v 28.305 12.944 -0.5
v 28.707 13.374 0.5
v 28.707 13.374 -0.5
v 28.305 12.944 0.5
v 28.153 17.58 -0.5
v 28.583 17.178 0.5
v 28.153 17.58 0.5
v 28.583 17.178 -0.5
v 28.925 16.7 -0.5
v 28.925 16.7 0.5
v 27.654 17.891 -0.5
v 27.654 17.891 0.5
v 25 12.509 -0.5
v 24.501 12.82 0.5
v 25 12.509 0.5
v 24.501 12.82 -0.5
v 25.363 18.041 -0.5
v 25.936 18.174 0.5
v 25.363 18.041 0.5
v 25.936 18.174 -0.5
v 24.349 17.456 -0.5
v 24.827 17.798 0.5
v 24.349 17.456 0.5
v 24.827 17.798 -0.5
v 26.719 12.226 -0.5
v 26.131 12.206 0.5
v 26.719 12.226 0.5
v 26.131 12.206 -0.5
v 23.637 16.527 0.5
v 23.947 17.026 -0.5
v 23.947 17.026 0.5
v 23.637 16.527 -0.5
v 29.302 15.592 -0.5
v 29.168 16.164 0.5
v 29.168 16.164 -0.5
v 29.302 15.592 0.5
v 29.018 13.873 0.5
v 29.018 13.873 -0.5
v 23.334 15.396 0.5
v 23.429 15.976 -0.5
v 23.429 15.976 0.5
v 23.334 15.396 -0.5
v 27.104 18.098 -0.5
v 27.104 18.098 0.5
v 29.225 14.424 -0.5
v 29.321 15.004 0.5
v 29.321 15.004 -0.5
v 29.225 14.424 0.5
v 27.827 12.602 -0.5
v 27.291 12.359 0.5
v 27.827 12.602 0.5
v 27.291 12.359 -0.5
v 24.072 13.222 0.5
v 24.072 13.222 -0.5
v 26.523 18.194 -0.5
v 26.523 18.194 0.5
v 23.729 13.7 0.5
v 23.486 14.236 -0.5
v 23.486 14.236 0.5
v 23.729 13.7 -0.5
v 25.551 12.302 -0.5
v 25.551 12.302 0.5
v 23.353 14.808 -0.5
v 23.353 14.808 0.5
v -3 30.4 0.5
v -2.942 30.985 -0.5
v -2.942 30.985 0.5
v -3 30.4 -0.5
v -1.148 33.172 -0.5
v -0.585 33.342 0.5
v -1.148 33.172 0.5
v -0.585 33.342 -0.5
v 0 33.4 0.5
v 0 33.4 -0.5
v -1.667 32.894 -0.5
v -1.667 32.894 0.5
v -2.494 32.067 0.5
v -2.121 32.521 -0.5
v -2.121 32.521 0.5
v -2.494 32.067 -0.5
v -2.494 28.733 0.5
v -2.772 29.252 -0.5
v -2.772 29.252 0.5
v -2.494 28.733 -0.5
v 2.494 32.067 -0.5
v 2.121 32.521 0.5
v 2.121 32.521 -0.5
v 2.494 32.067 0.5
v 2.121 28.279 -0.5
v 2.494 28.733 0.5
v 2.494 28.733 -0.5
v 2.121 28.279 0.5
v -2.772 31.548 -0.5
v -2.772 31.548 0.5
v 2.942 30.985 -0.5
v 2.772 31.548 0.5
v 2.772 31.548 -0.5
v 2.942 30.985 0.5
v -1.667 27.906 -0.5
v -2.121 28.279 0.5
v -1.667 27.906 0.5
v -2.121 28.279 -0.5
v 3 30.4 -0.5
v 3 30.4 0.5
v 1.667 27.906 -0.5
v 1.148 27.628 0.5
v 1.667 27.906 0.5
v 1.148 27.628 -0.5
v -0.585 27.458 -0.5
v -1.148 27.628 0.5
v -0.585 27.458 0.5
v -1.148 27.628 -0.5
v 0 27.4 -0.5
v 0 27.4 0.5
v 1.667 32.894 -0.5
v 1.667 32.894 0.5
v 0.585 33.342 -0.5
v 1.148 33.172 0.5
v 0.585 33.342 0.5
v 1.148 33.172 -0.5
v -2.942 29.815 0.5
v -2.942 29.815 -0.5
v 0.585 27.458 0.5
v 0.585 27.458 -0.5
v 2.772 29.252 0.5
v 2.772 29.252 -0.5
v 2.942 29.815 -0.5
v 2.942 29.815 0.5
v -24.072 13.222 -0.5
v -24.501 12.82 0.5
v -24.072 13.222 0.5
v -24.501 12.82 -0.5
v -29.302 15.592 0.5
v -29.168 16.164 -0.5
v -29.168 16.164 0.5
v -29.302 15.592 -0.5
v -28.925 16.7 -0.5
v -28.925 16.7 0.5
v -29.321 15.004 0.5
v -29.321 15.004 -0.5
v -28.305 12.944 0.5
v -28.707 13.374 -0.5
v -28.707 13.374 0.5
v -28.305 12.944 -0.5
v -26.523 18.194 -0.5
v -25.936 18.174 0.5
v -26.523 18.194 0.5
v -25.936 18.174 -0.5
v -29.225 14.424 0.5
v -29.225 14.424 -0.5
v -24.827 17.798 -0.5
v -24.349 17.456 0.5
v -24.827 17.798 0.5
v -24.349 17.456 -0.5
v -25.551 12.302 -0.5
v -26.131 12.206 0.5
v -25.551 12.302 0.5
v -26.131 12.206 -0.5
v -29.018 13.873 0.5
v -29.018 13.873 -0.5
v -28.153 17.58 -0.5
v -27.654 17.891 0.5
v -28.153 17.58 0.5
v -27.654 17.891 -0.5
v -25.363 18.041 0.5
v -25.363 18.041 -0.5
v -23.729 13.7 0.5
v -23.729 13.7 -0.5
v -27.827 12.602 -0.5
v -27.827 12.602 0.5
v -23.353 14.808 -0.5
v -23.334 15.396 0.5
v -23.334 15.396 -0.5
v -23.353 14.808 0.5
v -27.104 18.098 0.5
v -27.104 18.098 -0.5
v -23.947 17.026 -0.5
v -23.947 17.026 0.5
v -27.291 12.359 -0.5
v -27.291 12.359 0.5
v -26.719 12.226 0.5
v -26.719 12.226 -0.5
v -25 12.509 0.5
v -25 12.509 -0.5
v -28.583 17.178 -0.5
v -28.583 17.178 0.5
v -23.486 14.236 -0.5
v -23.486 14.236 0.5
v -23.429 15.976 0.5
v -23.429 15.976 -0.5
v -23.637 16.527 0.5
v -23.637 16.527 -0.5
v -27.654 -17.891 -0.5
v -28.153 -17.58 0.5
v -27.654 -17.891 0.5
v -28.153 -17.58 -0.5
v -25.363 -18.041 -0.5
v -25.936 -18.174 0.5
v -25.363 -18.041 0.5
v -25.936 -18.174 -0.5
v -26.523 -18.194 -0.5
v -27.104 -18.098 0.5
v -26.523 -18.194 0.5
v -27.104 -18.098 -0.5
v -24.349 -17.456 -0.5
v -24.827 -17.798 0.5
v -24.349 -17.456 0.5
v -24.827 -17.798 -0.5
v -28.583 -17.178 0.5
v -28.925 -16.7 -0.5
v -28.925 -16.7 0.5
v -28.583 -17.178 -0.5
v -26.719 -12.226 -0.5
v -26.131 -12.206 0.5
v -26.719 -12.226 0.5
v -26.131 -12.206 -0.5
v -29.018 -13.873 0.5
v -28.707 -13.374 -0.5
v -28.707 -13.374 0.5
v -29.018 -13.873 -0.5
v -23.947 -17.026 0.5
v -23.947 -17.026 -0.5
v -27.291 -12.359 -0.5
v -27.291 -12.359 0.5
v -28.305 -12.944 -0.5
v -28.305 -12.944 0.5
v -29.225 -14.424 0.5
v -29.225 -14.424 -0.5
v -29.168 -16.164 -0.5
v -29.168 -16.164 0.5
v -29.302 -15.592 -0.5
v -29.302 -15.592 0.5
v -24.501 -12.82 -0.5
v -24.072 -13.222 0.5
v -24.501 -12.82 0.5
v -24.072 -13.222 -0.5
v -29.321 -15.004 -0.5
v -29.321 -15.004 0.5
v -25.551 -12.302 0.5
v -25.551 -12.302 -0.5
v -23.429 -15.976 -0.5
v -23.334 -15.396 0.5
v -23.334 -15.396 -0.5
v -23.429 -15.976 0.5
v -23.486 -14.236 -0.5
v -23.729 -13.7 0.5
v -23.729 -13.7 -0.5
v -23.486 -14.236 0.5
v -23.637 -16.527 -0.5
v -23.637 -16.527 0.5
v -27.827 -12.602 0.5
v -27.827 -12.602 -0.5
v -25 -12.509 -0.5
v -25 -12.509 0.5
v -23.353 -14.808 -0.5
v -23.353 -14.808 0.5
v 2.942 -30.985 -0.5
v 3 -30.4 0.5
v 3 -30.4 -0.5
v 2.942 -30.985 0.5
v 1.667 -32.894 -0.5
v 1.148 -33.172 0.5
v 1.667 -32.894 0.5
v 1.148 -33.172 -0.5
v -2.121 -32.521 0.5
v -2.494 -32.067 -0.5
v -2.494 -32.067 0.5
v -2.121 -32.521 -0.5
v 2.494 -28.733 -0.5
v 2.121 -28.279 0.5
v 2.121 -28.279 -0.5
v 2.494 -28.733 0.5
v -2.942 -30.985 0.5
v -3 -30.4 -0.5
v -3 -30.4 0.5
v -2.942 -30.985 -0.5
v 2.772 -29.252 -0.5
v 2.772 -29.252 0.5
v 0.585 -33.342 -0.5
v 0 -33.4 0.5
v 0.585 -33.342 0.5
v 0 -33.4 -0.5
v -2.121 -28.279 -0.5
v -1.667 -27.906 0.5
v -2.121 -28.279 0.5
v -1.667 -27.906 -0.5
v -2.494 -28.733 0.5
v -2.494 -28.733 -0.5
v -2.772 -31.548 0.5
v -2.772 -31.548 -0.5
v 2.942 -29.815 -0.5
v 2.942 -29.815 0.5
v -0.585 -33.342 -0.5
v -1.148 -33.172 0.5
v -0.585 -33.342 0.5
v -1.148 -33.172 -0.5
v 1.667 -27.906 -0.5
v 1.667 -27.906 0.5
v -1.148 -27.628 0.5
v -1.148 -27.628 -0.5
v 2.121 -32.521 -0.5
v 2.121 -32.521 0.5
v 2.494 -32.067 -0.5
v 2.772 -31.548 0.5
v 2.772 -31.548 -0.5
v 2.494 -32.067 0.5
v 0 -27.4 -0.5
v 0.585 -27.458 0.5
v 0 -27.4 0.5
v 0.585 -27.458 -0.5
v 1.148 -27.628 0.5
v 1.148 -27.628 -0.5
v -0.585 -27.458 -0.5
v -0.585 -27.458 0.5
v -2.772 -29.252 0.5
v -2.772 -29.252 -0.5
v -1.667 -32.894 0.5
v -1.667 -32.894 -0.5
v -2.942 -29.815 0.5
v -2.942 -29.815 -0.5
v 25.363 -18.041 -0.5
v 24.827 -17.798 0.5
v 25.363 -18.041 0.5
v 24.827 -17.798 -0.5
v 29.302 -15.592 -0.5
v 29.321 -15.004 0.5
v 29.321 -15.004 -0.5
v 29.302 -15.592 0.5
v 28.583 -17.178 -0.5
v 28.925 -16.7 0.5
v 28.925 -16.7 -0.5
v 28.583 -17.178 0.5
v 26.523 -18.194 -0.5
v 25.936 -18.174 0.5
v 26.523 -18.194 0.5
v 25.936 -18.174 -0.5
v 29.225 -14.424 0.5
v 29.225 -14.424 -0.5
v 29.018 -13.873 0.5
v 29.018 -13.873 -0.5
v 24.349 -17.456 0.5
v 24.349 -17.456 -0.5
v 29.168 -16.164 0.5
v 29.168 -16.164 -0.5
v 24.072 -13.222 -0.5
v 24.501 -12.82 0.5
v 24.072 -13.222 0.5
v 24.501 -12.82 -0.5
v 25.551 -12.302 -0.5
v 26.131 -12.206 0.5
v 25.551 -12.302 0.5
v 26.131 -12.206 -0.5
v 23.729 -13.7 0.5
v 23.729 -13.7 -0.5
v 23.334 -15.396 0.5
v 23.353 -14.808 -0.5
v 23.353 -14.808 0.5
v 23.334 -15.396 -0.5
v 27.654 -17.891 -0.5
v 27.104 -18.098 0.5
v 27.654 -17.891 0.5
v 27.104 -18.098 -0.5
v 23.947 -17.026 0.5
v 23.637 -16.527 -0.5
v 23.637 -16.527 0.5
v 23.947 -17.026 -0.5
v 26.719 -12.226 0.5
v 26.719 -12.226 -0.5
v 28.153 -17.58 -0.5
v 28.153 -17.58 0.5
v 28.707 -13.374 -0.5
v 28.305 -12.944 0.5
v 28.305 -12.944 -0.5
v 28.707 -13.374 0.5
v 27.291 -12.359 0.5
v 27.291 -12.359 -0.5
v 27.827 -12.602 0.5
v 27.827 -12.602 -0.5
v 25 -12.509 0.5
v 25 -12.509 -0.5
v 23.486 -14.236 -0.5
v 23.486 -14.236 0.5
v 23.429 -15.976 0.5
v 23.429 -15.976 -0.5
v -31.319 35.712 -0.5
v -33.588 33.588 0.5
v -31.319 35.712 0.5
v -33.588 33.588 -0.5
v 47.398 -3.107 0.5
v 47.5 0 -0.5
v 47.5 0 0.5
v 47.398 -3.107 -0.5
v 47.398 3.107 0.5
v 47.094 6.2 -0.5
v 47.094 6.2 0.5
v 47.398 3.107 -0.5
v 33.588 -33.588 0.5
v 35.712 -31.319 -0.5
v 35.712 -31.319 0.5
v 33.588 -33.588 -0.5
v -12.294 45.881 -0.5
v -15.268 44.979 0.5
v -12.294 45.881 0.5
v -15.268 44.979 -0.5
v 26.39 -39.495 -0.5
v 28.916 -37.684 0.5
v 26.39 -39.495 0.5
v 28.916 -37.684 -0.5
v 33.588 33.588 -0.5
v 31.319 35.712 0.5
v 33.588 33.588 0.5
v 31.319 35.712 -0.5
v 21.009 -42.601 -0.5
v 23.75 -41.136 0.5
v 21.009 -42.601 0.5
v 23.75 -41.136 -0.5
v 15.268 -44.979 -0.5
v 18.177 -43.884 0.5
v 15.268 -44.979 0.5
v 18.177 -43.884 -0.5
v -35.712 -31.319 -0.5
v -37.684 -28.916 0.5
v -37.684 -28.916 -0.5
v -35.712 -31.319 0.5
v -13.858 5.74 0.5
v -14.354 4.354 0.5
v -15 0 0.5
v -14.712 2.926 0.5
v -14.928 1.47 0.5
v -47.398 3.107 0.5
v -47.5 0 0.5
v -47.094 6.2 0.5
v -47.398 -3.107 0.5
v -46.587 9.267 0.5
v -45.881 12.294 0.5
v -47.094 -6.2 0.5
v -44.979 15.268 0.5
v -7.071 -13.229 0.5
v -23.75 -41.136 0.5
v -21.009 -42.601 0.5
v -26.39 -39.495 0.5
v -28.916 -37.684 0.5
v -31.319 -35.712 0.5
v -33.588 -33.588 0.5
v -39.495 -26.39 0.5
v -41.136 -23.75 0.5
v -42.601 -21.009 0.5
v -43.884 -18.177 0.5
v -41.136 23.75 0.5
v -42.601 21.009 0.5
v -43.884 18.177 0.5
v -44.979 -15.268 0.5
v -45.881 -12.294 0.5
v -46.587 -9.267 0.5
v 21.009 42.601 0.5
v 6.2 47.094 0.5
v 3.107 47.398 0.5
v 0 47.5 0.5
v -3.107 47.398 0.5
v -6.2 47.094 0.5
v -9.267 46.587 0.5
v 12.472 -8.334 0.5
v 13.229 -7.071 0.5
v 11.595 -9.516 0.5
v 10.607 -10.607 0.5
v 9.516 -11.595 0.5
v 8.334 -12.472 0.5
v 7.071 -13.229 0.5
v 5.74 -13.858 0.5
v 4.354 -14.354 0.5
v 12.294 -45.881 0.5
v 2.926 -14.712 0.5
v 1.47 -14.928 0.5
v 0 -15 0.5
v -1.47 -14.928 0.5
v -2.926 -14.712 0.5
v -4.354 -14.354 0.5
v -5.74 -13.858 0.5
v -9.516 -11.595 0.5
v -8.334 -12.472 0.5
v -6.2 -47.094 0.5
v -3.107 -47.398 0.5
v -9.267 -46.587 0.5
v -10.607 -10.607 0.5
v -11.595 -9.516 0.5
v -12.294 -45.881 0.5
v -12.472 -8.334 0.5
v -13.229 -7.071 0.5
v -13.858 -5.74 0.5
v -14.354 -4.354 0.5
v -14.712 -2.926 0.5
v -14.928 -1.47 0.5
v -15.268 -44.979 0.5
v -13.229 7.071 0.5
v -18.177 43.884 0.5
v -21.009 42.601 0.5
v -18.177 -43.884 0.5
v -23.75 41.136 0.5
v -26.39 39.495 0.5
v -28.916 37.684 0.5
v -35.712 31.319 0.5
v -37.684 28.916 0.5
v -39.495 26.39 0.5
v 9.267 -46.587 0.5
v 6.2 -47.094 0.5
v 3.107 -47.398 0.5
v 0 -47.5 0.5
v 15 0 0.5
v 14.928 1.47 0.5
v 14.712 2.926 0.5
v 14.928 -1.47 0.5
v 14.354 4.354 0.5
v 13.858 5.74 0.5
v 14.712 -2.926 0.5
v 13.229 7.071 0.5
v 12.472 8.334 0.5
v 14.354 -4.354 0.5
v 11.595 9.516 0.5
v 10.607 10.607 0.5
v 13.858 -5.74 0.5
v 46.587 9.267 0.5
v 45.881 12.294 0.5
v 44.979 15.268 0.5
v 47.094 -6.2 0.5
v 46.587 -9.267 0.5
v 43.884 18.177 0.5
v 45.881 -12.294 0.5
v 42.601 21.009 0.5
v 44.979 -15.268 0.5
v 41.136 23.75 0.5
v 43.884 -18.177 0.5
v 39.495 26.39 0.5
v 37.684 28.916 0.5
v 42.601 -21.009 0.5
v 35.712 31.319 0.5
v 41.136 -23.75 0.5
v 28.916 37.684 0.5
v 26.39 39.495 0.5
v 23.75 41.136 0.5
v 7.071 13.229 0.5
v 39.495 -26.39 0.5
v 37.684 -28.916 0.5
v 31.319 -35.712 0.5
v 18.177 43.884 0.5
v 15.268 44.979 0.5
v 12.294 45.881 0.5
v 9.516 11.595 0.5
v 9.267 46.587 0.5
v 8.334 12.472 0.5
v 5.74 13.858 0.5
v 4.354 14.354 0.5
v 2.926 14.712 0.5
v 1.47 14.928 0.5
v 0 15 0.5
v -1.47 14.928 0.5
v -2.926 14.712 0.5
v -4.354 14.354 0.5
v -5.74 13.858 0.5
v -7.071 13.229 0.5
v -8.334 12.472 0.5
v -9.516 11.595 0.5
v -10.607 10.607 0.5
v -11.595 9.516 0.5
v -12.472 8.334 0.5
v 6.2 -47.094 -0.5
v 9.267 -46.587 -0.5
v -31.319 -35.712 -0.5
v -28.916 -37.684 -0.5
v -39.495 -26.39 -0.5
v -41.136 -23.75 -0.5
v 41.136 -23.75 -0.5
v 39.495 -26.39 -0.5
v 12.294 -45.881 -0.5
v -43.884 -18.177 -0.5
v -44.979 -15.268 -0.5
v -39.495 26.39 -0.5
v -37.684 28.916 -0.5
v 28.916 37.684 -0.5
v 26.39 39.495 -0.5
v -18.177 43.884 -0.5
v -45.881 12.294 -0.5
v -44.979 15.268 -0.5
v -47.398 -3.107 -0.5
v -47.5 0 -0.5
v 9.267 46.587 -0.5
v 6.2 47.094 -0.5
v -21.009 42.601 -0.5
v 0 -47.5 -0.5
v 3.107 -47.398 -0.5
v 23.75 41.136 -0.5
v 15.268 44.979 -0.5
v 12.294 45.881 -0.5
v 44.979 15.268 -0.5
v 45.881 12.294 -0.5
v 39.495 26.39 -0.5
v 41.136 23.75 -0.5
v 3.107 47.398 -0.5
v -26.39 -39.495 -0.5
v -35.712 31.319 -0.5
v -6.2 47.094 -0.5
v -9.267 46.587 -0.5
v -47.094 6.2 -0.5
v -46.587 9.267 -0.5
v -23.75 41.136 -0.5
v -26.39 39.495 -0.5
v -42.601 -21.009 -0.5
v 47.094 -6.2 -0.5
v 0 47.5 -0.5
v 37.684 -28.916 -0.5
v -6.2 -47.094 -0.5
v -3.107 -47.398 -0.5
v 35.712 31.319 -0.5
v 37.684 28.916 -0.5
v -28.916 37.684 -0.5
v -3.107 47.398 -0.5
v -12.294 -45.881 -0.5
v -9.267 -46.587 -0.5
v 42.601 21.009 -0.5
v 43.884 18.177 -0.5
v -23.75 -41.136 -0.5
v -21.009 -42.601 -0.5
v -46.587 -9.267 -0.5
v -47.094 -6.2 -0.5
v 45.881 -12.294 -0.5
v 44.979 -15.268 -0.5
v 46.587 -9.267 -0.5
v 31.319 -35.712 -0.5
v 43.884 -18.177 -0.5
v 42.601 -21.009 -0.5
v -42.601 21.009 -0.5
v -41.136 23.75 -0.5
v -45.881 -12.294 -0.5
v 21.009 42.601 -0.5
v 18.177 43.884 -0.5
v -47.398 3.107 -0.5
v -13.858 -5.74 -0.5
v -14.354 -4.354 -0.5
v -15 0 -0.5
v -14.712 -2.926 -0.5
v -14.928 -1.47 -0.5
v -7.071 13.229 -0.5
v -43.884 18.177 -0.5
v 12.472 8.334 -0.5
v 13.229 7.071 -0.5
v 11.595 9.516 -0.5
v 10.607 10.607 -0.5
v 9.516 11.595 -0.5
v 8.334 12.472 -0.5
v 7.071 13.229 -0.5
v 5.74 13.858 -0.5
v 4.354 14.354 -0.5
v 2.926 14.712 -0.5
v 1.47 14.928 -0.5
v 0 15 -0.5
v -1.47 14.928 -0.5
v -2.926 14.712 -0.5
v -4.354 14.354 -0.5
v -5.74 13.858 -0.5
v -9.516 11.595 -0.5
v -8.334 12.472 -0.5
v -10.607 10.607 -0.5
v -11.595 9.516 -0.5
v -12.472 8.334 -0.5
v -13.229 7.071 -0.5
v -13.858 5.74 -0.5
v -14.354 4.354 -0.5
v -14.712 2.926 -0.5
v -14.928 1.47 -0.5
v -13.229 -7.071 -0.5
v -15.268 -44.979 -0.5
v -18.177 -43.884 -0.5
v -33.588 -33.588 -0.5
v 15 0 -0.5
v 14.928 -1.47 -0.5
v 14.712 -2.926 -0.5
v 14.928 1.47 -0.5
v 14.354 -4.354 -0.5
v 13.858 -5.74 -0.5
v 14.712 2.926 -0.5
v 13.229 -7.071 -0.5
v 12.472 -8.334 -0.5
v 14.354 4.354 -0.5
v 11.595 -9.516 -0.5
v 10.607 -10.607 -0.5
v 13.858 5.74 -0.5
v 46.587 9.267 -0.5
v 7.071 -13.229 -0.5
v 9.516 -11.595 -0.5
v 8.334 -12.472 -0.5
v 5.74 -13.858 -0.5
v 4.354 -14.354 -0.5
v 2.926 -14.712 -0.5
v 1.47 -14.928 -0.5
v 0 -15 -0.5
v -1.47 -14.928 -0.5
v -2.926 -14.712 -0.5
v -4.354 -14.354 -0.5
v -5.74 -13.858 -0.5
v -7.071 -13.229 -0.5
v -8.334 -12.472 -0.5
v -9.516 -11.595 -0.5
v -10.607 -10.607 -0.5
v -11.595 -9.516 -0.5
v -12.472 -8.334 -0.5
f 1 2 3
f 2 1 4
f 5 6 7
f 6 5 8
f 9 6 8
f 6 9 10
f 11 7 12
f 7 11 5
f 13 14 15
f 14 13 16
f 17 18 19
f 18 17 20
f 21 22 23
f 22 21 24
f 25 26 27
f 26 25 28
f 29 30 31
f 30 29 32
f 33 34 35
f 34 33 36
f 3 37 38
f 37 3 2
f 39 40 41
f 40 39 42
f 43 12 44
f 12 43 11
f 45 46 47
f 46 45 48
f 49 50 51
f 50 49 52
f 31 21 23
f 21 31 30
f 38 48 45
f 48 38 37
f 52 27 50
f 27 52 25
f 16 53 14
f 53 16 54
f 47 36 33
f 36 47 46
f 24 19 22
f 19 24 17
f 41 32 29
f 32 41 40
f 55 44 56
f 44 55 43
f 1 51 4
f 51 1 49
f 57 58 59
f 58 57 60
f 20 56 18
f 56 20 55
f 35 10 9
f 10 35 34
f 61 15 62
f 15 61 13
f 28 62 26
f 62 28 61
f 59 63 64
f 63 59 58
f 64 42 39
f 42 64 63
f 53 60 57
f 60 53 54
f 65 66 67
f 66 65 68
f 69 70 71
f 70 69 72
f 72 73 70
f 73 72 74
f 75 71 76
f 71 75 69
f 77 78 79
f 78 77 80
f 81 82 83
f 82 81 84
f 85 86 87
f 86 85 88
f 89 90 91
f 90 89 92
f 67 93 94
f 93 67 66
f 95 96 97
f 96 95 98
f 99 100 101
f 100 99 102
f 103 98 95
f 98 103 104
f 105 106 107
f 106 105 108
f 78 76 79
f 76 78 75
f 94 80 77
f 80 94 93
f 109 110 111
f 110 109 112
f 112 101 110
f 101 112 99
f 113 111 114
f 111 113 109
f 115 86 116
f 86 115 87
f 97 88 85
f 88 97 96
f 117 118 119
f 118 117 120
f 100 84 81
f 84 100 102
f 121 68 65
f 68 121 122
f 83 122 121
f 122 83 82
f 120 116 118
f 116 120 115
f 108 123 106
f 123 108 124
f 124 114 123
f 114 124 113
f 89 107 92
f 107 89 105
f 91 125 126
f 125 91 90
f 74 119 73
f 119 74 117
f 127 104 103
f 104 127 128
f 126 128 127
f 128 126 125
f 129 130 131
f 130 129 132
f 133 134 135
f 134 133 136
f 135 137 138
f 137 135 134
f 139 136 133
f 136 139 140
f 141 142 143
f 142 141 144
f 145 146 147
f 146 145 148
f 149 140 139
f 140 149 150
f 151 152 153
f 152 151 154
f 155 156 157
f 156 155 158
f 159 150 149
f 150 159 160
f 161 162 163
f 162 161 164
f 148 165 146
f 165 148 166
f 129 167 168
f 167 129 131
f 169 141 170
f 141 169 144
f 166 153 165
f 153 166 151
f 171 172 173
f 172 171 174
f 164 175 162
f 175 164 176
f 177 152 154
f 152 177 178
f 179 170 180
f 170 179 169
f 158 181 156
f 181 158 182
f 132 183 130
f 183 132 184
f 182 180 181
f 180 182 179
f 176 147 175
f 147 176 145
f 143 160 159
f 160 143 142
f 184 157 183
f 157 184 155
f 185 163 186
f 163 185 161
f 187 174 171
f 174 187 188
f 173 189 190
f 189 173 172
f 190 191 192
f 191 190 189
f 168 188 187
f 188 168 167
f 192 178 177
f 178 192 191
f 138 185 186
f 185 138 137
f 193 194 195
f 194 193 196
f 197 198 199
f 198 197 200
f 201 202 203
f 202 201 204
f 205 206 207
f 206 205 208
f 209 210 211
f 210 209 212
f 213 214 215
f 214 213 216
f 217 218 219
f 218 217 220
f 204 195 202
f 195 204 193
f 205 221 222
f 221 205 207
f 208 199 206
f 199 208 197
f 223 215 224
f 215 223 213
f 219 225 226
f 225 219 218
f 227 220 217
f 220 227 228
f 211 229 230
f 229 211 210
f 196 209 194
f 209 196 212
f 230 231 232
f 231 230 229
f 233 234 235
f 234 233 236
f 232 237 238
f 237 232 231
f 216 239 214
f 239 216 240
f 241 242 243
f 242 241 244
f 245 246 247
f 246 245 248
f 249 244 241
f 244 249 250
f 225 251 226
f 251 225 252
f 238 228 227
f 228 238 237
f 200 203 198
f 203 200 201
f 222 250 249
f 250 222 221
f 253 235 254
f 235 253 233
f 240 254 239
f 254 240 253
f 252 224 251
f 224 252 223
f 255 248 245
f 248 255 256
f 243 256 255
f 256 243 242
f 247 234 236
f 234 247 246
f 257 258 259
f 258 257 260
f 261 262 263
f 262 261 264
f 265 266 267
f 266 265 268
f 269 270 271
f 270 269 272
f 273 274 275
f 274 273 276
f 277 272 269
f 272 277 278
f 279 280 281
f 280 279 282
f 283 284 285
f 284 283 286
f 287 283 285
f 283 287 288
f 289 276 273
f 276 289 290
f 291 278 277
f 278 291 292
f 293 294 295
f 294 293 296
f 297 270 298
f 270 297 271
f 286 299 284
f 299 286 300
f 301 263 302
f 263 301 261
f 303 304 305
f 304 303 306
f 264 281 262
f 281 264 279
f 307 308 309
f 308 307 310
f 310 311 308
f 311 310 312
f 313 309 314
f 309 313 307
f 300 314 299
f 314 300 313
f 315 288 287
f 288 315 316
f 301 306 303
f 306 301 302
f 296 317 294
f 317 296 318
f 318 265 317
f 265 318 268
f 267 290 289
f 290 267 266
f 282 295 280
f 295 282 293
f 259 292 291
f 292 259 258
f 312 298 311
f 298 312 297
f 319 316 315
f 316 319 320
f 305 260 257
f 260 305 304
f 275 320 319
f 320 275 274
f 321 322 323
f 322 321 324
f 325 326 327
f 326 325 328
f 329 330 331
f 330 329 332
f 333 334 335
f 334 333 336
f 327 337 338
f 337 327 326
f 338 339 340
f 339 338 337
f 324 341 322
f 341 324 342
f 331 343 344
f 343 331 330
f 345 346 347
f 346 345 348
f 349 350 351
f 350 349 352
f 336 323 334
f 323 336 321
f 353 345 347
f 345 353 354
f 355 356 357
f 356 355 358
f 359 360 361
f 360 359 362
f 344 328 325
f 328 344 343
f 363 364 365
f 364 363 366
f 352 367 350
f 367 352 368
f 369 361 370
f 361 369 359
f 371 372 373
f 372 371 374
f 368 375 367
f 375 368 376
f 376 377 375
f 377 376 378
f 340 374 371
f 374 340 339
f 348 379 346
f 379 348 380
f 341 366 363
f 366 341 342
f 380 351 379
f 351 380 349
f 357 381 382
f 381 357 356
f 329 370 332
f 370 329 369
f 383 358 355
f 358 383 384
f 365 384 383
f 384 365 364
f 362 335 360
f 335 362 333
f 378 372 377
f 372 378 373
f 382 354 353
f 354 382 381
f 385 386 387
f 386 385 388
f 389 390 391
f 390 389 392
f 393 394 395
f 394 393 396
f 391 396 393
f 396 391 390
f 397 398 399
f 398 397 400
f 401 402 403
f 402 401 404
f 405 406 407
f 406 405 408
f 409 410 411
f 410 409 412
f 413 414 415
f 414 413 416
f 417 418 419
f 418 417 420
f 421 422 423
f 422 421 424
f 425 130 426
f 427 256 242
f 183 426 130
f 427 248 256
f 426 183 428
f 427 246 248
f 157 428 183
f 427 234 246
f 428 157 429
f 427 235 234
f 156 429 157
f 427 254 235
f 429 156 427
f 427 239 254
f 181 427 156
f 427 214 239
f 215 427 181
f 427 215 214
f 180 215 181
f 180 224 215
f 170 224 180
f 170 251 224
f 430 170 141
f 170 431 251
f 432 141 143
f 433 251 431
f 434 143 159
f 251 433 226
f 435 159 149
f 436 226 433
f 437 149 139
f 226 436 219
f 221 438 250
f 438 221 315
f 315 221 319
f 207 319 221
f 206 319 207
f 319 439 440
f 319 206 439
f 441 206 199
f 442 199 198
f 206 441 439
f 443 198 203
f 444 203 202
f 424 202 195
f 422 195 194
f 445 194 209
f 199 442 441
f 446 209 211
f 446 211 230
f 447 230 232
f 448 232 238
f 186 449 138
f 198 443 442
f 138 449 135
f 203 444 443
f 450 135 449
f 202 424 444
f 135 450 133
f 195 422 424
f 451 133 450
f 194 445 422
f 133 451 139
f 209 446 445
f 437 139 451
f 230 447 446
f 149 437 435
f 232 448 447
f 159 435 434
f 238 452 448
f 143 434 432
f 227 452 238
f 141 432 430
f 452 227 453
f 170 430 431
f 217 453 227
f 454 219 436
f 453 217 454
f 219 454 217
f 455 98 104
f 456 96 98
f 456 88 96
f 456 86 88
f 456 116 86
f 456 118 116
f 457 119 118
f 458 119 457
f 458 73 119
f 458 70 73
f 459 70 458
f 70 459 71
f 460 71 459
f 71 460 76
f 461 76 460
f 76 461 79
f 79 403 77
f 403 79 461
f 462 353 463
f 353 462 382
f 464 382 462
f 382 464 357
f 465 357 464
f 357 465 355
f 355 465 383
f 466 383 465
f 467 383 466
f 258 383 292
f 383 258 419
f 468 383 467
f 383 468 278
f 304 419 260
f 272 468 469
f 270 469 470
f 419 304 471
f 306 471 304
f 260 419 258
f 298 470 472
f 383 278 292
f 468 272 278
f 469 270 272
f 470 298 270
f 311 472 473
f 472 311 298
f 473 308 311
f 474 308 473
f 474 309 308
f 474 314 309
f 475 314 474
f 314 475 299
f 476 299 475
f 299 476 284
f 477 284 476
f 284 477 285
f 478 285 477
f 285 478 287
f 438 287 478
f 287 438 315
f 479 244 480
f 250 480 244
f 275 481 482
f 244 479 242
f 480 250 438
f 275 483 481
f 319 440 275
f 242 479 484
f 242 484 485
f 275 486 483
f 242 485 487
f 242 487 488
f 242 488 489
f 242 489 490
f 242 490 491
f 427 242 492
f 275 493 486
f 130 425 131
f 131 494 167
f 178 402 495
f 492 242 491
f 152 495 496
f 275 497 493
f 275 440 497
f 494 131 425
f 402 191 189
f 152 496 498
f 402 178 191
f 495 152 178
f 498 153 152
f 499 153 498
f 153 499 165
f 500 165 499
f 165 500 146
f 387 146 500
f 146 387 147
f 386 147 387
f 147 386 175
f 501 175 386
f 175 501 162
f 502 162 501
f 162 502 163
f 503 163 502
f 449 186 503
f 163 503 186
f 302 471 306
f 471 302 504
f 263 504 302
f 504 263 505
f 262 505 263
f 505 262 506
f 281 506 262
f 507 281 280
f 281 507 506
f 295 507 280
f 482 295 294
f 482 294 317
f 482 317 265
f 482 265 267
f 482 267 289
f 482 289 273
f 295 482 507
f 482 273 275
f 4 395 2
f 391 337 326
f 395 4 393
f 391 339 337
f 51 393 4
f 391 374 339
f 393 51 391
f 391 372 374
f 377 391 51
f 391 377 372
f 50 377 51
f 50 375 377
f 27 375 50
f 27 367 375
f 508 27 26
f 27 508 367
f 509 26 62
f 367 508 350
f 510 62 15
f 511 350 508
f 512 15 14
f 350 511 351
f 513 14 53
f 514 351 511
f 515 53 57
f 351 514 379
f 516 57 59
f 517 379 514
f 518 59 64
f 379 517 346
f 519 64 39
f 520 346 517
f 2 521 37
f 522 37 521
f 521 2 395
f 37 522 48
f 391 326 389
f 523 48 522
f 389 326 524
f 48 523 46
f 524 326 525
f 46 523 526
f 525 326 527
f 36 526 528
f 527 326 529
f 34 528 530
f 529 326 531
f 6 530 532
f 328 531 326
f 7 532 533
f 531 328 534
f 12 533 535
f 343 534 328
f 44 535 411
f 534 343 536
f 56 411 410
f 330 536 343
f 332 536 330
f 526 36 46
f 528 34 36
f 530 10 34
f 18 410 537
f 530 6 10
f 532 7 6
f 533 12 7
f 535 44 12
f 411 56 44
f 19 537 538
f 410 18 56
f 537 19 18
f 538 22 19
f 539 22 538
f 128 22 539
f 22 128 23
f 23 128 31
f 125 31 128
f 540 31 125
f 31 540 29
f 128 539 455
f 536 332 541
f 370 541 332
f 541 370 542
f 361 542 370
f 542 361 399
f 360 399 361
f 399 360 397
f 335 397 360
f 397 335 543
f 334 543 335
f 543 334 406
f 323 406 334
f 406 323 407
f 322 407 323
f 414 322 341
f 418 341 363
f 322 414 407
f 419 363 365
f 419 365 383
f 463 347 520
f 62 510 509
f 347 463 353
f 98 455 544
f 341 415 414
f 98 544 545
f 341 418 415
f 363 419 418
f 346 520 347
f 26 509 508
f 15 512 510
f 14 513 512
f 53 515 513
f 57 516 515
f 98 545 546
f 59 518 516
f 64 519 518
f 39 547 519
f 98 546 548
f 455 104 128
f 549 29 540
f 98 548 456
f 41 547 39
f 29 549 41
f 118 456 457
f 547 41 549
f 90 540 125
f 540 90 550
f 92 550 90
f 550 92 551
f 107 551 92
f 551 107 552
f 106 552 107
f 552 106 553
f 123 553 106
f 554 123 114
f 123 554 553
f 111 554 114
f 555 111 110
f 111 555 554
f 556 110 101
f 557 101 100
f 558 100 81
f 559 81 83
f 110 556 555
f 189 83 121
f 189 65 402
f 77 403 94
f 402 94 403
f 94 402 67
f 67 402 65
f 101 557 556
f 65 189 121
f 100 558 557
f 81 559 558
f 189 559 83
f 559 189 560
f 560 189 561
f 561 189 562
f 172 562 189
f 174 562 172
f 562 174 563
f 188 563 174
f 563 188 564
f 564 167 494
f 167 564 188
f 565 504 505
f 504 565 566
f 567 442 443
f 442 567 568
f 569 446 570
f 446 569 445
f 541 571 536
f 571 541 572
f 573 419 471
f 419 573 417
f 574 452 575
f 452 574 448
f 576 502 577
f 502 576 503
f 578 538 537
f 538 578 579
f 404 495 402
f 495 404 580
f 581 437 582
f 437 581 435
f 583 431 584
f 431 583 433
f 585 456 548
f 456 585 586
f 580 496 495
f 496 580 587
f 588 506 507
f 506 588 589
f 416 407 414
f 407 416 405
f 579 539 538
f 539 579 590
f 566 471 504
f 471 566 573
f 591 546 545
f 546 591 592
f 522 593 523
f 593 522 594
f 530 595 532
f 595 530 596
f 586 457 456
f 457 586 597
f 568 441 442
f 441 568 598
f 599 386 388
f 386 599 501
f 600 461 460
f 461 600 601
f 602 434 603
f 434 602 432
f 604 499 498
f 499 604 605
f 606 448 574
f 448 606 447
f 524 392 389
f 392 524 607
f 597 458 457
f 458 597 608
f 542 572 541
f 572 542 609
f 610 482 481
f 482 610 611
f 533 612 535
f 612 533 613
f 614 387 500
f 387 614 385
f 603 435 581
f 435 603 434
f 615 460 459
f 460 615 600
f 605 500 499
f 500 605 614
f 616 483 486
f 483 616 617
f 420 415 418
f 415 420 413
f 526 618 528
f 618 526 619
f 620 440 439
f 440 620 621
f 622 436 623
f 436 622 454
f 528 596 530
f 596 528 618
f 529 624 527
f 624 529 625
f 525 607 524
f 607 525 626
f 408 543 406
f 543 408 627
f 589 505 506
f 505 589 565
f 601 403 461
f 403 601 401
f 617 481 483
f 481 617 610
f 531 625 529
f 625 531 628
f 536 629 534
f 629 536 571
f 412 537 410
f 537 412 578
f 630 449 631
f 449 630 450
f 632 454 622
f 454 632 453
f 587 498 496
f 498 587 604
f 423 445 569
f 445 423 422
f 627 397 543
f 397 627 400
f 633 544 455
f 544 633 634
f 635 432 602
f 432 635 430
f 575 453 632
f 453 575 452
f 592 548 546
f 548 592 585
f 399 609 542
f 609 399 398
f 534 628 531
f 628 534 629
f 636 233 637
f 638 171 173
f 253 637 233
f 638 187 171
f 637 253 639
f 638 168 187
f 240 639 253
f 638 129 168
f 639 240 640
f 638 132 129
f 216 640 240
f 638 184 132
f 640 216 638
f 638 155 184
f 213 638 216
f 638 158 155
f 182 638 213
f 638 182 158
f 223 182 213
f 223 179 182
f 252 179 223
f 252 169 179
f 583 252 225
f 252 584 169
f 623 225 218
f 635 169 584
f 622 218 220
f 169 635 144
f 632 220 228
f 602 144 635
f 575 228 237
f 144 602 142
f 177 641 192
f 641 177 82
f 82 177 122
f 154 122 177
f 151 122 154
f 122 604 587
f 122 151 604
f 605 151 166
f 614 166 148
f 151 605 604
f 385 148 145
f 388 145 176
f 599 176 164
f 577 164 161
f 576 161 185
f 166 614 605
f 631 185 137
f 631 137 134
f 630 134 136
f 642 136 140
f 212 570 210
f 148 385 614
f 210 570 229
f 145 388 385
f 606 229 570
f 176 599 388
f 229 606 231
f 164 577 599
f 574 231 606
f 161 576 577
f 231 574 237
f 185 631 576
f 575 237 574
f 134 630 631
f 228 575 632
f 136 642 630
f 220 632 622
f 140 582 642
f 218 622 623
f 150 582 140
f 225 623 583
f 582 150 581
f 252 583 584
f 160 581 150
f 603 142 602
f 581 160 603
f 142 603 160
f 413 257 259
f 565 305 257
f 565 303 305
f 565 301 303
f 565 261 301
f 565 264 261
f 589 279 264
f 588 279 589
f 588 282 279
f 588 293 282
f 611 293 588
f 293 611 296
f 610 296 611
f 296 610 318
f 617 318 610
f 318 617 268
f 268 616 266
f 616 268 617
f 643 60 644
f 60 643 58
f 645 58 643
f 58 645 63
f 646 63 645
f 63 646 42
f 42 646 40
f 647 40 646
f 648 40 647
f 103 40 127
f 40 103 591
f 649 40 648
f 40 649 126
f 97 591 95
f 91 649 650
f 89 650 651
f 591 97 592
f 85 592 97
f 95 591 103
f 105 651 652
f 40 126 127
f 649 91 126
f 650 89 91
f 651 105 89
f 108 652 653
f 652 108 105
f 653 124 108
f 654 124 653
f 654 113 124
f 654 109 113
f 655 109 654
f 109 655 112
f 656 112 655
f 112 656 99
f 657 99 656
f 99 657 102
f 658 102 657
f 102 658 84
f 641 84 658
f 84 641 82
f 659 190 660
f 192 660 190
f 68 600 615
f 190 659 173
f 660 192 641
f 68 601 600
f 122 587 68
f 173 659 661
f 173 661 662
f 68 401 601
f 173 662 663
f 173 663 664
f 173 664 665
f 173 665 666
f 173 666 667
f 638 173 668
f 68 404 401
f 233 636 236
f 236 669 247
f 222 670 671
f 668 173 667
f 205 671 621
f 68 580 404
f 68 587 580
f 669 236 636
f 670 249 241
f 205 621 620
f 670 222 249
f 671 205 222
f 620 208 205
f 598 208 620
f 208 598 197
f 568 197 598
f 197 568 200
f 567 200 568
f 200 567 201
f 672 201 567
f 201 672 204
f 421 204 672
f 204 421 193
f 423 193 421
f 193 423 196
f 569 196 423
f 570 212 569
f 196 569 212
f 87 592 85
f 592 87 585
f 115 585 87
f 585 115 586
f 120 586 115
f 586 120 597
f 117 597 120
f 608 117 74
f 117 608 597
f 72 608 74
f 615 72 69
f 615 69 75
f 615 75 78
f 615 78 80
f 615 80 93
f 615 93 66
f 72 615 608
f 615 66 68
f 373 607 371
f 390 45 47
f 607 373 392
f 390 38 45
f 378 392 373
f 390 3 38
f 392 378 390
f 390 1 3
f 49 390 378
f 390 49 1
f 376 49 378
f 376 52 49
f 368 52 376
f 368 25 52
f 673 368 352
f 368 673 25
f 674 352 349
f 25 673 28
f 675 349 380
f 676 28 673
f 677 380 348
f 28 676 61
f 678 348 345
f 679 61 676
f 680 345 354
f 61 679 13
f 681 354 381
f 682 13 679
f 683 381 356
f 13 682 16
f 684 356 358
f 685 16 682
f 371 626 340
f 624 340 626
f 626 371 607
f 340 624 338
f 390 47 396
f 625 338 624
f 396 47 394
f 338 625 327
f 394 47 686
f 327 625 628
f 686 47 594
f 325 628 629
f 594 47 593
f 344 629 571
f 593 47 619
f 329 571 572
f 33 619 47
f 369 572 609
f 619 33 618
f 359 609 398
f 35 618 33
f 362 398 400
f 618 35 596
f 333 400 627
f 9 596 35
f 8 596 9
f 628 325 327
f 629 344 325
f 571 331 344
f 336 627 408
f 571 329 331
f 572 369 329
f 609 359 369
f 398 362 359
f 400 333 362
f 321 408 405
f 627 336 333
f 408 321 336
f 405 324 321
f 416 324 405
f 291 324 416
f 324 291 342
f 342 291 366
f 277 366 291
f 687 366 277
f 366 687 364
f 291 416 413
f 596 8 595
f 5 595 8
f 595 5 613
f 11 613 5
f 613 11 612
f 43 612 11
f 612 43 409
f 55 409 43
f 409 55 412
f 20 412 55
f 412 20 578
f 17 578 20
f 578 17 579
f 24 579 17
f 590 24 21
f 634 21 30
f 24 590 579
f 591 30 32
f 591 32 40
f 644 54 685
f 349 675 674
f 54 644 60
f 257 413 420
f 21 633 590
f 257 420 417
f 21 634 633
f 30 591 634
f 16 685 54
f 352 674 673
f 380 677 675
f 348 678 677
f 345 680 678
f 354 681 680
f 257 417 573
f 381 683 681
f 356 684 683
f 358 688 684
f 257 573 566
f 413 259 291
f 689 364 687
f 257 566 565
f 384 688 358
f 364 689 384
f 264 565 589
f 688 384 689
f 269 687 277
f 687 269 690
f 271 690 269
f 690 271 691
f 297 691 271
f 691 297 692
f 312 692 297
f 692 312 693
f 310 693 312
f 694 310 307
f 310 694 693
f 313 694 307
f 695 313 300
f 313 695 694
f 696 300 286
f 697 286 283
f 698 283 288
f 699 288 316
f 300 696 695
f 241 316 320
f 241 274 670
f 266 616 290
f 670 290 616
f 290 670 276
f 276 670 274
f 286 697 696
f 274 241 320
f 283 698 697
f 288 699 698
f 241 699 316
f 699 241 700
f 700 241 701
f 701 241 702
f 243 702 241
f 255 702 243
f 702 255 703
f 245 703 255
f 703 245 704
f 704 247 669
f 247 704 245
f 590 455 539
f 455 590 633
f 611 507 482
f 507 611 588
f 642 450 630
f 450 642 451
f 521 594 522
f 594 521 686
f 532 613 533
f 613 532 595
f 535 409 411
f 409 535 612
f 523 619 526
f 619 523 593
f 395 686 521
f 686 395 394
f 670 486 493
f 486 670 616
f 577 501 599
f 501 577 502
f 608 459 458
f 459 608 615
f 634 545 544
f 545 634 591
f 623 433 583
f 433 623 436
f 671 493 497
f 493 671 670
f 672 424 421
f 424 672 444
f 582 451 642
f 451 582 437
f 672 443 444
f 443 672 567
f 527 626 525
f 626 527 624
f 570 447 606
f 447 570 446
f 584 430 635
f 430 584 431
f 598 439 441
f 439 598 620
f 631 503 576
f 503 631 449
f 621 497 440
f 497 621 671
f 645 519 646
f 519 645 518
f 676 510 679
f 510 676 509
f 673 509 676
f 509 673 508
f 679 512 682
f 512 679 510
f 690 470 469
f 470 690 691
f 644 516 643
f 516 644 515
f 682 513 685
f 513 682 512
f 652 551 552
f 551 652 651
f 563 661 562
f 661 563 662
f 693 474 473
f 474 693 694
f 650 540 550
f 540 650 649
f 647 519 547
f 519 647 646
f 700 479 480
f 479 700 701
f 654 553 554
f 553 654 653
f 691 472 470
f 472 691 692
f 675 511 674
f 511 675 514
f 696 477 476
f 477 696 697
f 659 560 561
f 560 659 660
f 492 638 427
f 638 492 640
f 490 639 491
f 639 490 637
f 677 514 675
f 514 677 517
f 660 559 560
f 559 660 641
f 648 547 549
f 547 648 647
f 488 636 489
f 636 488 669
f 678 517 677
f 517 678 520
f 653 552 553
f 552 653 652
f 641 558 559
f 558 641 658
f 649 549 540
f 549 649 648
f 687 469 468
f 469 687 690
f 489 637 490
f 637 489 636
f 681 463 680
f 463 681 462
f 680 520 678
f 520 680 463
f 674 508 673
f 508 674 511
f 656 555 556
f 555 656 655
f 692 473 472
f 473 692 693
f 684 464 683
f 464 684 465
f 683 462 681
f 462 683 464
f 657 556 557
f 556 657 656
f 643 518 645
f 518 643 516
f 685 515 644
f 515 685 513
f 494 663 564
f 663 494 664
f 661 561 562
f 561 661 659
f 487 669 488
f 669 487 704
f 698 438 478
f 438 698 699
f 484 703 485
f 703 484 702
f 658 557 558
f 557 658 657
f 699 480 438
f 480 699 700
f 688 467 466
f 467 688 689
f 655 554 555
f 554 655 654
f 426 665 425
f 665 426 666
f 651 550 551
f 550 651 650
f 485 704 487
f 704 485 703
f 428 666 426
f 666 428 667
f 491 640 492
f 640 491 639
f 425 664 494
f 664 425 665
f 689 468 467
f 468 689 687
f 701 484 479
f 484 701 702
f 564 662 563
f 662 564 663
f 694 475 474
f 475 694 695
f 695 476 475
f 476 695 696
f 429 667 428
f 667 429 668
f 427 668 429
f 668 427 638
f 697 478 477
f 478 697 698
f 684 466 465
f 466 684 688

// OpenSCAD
/*
 * Precise spacer rings for HDD platter stack
 * 1.0 mm default (24 required for 25 platters @ 1 mm gap)
 * Lightening holes for material savings + easier printing
 * Parametric — change thickness or OD for your build
 */

module platter_spacer(od=95, thickness=1.0, id=30) {
    difference() {
        cylinder(d=od, h=thickness, center=true, $fn=96);
        cylinder(d=id, h=thickness+0.2, center=true, $fn=64);
        
        // 6 lightening holes (optional — remove if you want solid rings)
        for (i = [0:5]) {
            rotate([0,0,i*60 + 30])
                translate([od*0.32, 0, 0])
                    cylinder(d=6, h=thickness+0.2, center=true, $fn=32);
        }
    }
}

// Render one (or use in a loop in your slicer project)
platter_spacer(thickness=1.0);

// For batch export you can do:
// for (i=[1:24]) translate([i*3,0,0]) platter_spacer();
